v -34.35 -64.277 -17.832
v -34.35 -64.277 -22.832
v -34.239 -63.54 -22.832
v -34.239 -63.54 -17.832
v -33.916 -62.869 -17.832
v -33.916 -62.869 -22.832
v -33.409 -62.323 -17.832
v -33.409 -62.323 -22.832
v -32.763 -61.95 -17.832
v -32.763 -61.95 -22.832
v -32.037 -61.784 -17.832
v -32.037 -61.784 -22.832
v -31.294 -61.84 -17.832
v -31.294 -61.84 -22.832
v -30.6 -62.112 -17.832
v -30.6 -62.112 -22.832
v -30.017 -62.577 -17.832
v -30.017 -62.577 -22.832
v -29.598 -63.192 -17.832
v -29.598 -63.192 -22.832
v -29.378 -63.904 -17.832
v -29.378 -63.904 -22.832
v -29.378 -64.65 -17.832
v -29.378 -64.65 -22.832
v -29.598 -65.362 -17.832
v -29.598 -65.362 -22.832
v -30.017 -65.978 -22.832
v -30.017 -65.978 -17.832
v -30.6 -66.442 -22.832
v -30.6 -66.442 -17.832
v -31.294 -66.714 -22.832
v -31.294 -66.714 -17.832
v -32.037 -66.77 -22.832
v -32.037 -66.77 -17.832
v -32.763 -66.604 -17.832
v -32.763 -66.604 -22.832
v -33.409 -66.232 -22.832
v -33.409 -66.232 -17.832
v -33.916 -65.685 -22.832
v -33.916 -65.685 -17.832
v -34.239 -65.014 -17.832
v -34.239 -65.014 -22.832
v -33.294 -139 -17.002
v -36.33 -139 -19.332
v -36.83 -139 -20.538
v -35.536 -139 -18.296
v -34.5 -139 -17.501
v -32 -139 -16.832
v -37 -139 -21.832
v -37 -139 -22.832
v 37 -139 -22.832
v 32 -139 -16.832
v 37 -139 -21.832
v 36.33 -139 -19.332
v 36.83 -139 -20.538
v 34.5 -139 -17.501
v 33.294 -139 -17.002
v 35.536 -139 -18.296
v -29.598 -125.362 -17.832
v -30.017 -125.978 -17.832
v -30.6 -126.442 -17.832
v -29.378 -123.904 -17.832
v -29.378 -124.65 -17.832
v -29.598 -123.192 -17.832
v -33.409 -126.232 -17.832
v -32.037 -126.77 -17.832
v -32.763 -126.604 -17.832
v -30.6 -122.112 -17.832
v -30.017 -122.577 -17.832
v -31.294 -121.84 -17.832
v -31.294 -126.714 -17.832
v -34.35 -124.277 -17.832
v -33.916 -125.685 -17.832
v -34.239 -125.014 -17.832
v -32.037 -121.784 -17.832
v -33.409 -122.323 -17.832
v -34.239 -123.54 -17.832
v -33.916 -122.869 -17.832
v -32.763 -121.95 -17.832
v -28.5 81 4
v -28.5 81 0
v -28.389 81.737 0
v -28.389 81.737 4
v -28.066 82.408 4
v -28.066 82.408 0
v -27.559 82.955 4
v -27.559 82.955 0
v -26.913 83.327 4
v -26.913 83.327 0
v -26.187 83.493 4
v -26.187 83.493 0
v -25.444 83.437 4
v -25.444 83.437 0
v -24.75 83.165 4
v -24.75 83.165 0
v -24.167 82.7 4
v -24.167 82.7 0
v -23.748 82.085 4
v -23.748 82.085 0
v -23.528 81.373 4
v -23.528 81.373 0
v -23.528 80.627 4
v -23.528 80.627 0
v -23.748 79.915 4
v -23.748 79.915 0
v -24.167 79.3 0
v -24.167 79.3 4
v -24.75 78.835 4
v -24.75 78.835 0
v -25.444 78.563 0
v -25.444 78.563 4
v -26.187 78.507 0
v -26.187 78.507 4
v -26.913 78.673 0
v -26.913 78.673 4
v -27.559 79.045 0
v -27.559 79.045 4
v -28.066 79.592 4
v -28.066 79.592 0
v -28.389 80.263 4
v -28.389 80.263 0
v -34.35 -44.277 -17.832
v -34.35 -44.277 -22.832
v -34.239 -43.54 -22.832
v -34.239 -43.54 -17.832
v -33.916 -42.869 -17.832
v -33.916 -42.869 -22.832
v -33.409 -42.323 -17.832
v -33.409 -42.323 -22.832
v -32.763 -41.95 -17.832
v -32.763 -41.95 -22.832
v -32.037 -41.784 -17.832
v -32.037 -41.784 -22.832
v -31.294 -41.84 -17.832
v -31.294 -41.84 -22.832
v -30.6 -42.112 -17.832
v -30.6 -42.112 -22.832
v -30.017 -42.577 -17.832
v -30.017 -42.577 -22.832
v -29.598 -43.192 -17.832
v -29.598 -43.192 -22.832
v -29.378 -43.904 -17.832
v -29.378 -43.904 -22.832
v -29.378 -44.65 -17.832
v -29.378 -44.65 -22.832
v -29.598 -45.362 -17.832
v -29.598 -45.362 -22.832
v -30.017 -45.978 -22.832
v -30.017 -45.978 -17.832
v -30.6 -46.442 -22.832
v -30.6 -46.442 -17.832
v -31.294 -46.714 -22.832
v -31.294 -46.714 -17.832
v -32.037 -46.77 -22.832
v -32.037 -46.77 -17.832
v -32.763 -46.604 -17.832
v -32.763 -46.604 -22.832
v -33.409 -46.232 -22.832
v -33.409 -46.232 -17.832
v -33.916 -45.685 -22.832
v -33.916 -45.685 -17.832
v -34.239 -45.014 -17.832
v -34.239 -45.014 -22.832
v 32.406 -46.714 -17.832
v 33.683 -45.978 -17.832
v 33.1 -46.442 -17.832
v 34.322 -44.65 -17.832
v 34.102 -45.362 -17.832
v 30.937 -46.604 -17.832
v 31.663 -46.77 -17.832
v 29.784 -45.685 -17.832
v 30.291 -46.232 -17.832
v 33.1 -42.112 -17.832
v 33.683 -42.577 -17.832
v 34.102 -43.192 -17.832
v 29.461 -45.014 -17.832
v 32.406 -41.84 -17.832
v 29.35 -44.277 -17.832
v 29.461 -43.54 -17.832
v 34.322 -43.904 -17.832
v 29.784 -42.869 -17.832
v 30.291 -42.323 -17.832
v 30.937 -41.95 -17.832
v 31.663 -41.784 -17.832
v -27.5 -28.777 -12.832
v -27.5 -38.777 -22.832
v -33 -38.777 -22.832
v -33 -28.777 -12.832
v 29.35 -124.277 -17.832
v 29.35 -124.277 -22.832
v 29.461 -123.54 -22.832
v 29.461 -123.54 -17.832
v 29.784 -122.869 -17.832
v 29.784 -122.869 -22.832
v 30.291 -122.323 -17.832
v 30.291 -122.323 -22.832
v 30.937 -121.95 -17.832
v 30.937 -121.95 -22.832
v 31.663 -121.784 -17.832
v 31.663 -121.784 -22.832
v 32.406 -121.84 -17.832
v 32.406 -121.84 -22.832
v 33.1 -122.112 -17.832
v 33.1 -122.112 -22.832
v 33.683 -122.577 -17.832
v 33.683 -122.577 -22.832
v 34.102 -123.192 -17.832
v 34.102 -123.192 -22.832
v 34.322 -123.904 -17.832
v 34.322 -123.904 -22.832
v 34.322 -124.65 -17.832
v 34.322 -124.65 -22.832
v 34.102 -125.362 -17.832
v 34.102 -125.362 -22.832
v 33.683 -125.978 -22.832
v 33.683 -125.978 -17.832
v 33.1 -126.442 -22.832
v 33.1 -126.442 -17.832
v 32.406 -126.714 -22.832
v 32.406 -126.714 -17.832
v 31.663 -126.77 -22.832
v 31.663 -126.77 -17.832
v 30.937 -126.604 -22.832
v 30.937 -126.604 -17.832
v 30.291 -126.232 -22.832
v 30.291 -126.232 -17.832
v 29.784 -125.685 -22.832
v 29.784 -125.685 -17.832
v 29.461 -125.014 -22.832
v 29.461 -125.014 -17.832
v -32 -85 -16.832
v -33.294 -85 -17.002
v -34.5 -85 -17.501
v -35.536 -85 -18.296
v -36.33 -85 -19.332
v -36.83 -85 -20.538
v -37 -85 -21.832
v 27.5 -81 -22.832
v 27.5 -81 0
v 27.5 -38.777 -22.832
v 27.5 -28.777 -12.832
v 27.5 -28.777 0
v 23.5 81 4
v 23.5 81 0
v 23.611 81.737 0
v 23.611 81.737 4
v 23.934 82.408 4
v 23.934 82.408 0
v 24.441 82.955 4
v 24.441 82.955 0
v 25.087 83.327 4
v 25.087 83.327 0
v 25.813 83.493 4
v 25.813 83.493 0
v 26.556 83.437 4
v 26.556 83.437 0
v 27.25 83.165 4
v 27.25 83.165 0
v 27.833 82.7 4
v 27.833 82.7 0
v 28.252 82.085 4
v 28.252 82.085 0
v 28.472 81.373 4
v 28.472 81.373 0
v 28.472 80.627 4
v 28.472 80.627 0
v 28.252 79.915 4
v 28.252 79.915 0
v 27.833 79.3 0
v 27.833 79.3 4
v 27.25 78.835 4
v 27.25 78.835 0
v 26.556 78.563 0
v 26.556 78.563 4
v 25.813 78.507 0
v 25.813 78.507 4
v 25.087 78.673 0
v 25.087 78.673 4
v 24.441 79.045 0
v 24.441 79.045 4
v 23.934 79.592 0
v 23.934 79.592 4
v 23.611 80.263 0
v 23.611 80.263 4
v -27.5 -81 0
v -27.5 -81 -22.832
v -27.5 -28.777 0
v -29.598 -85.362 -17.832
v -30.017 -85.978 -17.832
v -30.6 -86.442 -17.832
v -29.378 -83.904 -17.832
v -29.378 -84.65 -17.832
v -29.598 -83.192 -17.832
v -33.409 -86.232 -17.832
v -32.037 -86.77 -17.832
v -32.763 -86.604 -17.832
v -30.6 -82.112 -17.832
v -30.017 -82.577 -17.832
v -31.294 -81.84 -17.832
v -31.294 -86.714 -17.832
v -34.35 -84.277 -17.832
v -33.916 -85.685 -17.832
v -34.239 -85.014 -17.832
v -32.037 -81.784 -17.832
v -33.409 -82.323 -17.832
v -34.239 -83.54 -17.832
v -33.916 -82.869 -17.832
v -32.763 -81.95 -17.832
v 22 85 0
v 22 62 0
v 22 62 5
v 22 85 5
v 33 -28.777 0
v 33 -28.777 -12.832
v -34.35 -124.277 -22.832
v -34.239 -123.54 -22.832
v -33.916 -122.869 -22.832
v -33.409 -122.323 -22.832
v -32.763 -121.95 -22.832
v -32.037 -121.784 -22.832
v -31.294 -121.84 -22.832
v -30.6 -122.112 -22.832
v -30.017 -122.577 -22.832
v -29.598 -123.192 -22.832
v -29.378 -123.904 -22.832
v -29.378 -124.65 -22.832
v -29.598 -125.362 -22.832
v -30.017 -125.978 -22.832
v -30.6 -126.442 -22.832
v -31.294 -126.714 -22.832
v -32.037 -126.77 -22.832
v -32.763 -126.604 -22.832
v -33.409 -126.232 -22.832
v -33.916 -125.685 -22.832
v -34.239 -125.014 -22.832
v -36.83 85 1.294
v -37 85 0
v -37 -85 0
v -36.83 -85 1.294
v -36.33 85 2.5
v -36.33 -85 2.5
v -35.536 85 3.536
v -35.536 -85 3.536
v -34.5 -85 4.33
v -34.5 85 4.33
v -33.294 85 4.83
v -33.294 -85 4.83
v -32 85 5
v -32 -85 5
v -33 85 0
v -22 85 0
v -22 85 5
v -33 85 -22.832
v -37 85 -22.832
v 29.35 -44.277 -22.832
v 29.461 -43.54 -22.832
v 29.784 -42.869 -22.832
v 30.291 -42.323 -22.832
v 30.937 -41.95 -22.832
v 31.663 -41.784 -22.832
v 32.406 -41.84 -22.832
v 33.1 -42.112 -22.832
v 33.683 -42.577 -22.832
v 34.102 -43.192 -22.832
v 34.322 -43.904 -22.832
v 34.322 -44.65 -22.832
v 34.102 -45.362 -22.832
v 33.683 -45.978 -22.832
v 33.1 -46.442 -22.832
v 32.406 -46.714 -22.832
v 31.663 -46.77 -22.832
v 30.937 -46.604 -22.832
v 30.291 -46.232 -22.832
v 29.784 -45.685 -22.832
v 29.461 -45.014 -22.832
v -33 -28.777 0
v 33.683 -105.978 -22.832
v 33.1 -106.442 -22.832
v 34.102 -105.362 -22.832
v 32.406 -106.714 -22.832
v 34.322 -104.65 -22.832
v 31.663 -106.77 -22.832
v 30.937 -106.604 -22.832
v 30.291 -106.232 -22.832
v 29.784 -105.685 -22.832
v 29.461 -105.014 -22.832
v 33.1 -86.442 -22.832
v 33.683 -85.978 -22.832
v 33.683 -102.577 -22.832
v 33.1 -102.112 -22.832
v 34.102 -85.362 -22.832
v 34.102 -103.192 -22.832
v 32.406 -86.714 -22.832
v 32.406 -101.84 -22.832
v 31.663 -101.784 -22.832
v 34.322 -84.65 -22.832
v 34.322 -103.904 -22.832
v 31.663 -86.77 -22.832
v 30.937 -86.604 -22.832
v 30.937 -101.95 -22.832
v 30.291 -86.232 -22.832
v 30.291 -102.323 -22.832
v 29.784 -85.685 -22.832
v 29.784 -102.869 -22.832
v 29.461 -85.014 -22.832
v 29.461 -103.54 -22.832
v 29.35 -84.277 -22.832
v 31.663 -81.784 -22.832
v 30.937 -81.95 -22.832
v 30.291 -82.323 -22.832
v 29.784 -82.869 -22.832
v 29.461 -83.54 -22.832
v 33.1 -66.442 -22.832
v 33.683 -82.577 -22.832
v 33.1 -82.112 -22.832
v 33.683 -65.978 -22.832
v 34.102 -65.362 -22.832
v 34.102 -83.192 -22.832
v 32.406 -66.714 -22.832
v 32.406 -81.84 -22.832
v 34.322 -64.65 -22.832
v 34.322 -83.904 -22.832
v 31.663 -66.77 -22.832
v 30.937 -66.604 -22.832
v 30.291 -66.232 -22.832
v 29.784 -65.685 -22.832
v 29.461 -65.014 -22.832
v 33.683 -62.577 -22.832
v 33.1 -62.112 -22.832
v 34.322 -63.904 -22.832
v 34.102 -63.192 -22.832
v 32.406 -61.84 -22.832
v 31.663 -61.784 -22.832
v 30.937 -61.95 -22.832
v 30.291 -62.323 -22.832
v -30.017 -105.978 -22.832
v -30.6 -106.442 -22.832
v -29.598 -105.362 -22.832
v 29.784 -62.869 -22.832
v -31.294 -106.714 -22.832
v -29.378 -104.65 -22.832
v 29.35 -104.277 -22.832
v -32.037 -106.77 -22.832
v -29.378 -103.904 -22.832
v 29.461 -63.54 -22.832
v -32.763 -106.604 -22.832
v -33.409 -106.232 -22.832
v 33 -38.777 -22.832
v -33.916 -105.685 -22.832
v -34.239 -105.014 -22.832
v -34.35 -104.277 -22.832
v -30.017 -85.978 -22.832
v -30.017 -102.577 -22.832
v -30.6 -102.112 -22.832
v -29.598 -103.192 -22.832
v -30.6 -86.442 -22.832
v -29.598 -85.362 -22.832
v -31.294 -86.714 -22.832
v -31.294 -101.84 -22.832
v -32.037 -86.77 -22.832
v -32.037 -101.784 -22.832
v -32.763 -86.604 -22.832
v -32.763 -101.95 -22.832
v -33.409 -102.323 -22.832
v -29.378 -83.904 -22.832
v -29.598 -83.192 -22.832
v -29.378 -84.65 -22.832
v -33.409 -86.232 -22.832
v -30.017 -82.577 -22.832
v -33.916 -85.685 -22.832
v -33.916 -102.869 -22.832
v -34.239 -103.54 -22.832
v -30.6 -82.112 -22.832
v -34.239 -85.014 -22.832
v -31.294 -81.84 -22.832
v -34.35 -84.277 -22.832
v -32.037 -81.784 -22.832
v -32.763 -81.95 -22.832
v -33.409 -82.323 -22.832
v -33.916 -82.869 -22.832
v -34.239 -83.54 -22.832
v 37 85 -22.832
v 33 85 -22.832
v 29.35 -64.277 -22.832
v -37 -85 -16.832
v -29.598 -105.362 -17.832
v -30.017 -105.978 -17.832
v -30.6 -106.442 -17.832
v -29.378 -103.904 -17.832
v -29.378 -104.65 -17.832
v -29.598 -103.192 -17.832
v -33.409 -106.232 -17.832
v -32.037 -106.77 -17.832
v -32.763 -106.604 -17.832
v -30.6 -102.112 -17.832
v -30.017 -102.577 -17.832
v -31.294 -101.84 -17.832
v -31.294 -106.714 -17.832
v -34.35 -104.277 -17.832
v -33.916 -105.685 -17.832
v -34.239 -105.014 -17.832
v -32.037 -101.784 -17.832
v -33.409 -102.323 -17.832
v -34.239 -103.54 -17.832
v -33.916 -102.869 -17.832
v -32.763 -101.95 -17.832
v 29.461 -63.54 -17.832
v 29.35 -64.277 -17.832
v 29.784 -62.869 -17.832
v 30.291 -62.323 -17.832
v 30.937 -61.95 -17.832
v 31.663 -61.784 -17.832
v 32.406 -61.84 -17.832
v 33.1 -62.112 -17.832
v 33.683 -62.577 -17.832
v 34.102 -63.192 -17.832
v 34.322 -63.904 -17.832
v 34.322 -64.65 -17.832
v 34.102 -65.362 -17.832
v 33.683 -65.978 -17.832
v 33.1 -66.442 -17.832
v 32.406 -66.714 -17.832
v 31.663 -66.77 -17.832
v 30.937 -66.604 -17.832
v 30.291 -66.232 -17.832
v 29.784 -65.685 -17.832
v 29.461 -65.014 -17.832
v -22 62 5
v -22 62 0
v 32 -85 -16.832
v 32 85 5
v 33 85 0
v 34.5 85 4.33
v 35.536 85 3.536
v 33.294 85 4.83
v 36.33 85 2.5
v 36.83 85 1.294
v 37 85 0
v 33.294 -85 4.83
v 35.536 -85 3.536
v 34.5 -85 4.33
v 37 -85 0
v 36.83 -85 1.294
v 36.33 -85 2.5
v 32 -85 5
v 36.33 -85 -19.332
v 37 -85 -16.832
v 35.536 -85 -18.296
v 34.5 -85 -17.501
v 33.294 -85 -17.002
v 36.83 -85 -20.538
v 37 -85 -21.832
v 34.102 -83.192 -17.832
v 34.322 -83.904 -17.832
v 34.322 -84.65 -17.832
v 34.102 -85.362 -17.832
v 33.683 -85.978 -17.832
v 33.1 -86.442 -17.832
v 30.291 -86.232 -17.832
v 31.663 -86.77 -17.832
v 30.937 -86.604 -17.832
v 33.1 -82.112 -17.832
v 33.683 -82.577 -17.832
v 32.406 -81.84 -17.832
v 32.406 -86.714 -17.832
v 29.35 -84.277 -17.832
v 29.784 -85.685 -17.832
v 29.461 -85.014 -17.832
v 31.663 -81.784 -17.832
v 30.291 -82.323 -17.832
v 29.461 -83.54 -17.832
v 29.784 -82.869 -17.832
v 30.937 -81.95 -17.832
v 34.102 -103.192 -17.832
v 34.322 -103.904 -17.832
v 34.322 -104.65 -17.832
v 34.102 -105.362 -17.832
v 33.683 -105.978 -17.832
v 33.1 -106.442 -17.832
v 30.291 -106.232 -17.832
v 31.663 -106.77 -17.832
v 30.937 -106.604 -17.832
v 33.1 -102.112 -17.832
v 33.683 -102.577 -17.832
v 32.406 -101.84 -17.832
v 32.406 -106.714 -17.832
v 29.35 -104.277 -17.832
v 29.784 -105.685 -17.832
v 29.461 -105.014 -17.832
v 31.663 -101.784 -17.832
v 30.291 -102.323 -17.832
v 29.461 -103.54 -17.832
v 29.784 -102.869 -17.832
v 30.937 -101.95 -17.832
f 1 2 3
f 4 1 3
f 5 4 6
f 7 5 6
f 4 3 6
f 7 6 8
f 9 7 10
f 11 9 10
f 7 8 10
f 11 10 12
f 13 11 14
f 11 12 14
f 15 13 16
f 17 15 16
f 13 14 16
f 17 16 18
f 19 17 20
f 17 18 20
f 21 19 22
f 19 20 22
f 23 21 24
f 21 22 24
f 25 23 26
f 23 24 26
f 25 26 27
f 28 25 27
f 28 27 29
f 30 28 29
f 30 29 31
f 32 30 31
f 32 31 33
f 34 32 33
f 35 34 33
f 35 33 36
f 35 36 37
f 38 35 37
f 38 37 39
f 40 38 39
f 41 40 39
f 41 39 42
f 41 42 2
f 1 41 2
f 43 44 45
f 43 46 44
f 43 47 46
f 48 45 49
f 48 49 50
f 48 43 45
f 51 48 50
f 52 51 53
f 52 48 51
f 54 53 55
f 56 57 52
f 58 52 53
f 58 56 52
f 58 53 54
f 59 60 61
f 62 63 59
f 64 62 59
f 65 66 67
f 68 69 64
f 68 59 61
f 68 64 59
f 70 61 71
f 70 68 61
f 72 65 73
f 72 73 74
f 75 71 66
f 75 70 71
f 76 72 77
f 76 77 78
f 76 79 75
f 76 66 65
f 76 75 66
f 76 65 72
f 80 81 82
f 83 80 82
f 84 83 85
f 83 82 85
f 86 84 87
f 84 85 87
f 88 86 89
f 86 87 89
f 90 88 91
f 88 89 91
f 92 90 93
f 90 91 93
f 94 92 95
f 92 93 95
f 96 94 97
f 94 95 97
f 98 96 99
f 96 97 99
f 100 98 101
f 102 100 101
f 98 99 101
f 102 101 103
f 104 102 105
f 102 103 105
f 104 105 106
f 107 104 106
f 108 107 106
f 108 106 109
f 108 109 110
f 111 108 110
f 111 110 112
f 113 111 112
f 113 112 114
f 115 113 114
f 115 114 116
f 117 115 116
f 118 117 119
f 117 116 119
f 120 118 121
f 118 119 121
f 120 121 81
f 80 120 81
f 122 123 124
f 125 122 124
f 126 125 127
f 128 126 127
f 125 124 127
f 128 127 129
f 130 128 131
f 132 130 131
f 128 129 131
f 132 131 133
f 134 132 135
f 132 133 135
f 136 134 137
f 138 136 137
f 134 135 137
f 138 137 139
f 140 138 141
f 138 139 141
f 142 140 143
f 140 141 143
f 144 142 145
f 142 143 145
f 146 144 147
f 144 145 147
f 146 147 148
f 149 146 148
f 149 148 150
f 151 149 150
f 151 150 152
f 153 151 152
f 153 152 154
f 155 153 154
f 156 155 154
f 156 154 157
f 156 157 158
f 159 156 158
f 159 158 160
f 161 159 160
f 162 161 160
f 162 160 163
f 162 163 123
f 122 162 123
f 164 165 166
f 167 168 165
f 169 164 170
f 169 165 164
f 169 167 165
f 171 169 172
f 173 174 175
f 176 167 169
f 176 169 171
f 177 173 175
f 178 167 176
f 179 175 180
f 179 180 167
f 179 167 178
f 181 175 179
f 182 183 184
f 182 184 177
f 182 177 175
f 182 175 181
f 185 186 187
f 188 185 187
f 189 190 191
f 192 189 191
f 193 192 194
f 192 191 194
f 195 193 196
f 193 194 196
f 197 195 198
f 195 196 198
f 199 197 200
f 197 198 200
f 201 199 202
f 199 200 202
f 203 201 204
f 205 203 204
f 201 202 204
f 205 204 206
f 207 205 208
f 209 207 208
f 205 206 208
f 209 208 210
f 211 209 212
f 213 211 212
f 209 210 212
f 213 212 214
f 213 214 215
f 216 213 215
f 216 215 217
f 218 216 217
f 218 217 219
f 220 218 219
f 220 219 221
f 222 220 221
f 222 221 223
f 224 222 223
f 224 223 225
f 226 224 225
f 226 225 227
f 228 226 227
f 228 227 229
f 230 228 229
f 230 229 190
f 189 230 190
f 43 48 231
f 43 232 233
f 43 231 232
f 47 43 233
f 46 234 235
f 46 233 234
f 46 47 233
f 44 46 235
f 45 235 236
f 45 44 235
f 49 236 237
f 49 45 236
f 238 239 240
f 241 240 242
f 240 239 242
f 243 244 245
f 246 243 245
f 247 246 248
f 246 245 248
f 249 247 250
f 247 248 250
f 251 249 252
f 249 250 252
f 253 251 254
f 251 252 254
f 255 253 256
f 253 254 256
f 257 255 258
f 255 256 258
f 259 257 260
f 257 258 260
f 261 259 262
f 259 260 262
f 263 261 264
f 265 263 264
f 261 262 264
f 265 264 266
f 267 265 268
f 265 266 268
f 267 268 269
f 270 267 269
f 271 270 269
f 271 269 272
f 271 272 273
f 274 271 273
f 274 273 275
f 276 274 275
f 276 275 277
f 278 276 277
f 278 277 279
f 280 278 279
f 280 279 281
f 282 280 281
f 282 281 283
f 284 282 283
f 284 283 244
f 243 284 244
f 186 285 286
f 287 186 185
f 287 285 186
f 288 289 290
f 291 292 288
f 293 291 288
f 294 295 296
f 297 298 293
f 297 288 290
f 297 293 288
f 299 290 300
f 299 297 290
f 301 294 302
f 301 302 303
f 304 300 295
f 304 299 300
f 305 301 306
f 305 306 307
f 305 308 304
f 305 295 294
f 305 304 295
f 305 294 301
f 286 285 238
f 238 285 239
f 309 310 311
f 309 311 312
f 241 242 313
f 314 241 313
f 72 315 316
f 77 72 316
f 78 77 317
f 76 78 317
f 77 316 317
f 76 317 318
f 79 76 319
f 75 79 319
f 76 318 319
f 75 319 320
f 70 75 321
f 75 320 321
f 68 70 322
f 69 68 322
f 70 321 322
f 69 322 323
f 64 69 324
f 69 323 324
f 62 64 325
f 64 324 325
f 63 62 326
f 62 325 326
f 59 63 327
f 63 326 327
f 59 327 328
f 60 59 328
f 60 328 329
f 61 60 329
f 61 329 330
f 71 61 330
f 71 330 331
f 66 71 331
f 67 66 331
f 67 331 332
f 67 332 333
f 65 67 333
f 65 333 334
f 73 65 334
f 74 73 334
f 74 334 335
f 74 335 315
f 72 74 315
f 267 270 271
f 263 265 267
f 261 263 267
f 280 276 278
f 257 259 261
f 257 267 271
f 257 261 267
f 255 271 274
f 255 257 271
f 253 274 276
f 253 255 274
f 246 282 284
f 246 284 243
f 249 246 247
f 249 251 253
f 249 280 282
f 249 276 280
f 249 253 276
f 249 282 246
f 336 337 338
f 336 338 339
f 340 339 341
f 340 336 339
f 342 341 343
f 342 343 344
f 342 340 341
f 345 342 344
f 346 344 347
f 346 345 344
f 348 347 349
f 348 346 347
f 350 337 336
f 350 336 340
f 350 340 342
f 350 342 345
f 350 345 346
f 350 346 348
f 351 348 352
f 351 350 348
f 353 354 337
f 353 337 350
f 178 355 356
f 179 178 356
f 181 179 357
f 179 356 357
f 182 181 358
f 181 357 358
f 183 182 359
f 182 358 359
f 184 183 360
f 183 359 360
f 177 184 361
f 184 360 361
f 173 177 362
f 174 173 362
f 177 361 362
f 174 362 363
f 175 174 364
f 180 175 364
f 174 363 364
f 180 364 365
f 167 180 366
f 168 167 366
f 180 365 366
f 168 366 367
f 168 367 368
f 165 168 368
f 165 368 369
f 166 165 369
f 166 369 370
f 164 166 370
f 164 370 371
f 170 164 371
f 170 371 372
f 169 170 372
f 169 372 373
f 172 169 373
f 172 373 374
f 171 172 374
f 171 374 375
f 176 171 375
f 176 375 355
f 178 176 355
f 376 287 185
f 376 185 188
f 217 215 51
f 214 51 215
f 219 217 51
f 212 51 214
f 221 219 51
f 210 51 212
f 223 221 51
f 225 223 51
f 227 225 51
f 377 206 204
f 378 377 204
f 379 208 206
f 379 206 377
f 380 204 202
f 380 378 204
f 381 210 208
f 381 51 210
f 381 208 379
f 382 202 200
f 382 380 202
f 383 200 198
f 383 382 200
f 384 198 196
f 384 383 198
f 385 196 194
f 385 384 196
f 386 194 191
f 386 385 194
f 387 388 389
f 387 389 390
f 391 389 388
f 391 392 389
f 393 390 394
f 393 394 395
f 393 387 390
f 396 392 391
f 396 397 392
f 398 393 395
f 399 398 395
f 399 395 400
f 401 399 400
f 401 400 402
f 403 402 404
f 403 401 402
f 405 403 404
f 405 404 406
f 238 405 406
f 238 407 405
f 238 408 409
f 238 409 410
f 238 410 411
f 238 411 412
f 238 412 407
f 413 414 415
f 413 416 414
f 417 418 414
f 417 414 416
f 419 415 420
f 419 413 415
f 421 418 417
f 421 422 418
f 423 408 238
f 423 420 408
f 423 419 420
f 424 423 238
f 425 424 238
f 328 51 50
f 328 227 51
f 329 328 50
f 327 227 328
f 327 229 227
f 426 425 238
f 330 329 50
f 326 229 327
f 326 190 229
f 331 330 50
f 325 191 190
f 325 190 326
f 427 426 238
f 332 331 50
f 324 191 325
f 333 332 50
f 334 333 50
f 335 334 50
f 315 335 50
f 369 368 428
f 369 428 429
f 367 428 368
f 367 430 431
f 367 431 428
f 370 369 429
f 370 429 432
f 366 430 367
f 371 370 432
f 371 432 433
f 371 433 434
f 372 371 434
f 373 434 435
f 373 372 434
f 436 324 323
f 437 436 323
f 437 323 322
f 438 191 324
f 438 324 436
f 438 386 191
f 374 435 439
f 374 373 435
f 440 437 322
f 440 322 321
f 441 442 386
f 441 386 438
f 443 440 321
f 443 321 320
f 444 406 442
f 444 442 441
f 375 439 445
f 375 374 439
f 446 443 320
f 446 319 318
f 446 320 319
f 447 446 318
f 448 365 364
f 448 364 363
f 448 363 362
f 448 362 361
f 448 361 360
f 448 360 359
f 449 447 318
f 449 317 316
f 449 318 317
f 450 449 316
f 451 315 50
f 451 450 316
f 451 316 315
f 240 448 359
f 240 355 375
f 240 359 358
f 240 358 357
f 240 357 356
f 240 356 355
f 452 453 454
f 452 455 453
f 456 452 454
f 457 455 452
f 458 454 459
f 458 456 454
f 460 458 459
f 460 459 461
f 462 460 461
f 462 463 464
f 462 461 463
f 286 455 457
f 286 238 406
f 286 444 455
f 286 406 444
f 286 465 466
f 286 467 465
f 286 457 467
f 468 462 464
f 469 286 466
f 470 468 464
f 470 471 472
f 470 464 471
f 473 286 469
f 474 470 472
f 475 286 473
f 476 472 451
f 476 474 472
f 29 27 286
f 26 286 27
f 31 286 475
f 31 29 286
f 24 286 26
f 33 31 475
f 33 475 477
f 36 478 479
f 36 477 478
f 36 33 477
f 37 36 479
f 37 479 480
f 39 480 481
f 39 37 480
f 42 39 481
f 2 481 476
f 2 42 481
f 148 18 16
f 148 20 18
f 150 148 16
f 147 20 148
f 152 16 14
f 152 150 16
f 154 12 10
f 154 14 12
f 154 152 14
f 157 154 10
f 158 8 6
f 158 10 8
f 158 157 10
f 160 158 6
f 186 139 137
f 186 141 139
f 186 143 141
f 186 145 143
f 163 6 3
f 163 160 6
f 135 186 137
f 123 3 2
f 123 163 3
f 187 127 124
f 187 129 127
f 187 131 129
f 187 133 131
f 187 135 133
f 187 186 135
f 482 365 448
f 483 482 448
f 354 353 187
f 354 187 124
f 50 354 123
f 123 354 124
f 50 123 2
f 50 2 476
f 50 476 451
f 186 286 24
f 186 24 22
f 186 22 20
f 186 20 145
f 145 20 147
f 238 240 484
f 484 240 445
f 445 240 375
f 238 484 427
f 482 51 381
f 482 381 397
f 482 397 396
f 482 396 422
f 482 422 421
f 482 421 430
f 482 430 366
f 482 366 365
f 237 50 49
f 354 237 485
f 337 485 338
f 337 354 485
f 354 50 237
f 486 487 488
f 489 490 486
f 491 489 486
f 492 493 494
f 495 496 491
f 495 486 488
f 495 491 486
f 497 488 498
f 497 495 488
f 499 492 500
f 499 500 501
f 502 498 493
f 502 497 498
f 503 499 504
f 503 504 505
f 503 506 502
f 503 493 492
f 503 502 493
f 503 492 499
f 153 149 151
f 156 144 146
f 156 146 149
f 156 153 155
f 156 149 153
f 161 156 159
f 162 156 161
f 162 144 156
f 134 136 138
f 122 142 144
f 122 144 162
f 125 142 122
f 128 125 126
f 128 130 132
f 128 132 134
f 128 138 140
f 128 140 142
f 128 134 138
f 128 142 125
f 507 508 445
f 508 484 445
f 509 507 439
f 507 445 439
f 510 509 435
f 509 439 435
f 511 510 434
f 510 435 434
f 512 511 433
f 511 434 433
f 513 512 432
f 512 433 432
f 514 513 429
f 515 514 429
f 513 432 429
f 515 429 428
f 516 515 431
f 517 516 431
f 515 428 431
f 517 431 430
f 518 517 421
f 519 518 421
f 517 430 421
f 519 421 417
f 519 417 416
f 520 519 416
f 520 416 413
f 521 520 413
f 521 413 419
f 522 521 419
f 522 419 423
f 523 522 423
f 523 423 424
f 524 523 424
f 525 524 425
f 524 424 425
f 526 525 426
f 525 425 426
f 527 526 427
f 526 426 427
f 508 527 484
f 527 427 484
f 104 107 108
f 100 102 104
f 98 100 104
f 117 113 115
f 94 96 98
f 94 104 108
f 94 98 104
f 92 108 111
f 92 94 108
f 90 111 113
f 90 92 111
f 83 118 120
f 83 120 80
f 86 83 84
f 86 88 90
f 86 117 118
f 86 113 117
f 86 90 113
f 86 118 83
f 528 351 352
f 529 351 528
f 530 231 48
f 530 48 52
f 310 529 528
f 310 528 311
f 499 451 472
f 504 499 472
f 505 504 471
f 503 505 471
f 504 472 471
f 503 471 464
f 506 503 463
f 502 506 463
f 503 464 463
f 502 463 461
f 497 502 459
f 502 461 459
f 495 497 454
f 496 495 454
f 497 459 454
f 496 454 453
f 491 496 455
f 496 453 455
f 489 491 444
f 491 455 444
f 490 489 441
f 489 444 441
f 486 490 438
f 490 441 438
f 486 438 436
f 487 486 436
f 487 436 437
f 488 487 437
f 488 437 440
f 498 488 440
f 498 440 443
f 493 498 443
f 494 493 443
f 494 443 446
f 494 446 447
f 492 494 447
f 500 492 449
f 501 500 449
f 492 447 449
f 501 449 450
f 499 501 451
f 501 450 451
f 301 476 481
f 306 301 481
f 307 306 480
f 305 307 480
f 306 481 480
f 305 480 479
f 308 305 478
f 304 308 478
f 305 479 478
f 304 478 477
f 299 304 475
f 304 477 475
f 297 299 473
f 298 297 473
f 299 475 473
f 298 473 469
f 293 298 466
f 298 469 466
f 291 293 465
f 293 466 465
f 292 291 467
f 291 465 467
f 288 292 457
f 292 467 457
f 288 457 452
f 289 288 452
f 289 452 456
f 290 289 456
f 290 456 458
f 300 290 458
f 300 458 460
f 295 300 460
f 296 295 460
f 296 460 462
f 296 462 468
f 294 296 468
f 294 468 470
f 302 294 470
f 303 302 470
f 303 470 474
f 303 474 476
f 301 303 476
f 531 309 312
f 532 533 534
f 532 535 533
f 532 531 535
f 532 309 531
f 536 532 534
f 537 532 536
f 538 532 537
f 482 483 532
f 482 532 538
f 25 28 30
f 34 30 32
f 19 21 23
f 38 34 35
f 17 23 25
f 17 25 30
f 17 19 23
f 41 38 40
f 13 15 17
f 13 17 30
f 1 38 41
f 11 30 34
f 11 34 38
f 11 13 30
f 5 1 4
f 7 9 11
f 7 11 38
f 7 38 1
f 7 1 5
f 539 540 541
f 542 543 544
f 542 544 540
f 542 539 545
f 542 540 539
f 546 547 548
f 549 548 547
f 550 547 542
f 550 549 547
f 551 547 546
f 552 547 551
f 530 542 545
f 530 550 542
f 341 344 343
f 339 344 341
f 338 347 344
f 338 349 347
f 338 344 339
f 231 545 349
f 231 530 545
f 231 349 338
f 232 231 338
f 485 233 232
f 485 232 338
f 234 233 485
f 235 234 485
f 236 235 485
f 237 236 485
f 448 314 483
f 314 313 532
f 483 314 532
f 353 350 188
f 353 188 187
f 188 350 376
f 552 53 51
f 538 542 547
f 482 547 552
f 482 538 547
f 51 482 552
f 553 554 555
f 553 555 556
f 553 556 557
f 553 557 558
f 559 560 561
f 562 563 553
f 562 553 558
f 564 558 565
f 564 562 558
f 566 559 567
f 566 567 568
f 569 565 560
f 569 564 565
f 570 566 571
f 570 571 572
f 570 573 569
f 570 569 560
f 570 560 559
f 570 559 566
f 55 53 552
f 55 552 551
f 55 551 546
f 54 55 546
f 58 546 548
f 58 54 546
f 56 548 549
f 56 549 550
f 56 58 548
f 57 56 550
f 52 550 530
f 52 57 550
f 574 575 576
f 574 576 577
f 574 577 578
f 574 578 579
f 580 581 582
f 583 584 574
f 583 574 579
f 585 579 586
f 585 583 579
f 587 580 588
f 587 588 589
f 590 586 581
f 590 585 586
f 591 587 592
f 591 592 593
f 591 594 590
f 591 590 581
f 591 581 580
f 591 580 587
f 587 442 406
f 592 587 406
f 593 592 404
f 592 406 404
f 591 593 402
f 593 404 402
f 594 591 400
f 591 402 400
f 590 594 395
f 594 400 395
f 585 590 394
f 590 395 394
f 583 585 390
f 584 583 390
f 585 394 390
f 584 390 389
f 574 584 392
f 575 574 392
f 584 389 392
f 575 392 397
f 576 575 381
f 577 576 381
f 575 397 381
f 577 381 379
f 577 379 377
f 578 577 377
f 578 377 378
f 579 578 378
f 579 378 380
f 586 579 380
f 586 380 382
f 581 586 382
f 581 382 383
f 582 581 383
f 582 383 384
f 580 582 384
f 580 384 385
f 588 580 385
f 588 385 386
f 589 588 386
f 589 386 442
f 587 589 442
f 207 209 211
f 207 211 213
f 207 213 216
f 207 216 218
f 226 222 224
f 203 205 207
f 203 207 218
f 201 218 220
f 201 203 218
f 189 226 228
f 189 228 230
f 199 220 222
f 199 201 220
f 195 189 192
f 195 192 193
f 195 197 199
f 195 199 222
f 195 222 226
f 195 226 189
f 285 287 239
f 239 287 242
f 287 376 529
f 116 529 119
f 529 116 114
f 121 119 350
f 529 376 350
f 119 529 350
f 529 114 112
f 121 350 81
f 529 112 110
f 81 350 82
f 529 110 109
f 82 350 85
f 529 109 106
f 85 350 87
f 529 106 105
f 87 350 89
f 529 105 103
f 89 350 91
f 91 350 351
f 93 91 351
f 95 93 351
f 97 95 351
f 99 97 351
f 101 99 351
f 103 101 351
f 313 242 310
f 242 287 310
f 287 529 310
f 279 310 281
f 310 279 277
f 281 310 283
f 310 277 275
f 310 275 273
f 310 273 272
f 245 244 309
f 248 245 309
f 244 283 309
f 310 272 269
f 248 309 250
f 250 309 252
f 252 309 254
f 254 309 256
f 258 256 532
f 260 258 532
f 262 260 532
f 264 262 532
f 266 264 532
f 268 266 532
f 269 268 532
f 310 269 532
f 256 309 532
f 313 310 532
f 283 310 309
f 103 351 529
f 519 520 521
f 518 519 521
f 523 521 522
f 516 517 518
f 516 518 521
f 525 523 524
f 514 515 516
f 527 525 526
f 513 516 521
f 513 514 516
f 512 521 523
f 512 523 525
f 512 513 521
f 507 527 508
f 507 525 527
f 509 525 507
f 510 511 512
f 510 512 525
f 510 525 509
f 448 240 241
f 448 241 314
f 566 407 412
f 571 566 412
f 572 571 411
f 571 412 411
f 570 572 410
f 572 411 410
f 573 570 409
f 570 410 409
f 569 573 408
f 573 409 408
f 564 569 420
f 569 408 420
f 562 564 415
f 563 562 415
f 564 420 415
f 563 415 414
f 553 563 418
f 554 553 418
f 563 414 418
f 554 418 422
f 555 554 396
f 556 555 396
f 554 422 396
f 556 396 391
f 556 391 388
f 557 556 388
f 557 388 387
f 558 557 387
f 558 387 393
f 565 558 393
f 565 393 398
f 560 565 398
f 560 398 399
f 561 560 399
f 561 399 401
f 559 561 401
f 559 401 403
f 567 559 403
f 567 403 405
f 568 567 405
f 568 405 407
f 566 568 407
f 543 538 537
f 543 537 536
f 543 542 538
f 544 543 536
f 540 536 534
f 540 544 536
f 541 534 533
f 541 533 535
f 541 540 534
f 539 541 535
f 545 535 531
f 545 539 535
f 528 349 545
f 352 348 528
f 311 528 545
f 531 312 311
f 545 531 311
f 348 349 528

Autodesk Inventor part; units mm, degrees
ref_plane "YZ Plane" through (0, 0, 0) normal (1, 0, 0) x (0, 1, 0)
ref_plane "XZ Plane" through (0, 0, 0) normal (0, 1, 0) x (-1, 0, 0)
ref_plane "XY Plane" through (0, 0, 0) normal (0, 0, 1) x (1, 0, 0)
sketch "Sketch1" plane through (0, 0, 0) normal (0, 0, 1) x (1, 0, 0)
  line L0 (-37, 85) -> (37, 85)
  line L1 (37, 85) -> (37, -85)
  line L2 (37, -85) -> (-37, -85)
  line L3 (-37, -85) -> (-37, 85)
  line L4 (-37, 85) -> (37, -85) construction
  line L5 (37, 85) -> (-37, -85) construction
  line L6 (22, 85) -> (-22, 85)
  line L7 (-22, 85) -> (-22, 62)
  line L8 (-22, 62) -> (22, 62)
  line L9 (22, 62) -> (22, 85)
  point P0 (0, 0)
  point P1 (0, 62)
  point P2 (0, 85)
  point P3 (-22, 85)
  dimension "d0" = 74
  dimension "d1" = 170
  dimension "d9" = 44
  dimension "d10" = 23
extrude "Extrusion1" add sketch "Sketch1" along normal blind 5 contours L0 L7 L8 L9 L1 L2 L3
sketch "Sketch2" plane through (0, 0, 0) normal (0, 0, -1) x (-1, 0, 0)
  circle A0 centre (-26, 81) radius 2.5
  line L0 (0, 0) -> (0, 85)
  line L1 (-37, 85) -> (37, 85) projected
  circle A1 centre (26, 81) radius 2.5
  dimension "d4" = 5
  dimension "d5" = 52
  dimension "d8" = 4
extrude "Extrusion2" cut sketch "Sketch2" against normal blind 4
sketch "Sketch3" plane through (0, 0, 0) normal (0, 0, -1) x (-1, 0, 0)
  line L0 (37, -85) -> (-37, -85) projected
  line L1 (-37, 85) -> (-37, -85)
  line L2 (-37, -85) -> (37, -85)
  line L3 (37, -85) -> (37, 85)
  line L4 (33, 85) -> (33, -81)
  line L5 (33, -81) -> (-33, -81)
  line L6 (-33, -81) -> (-33, 85)
  line L7 (-37, 85) -> (-22, 85) projected
  line L8 (-37, 85) -> (-33, 85)
  line L9 (22, 85) -> (37, 85) projected
  line L10 (33, 85) -> (37, 85)
  line L11 (-33, -81) -> (-27.5, -81)
  line L12 (-27.5, -81) -> (-27.5, -28.7771)
  line L13 (-27.5, -28.7771) -> (-33, -28.7771)
  line L14 (-33, -28.7771) -> (-33, -81)
  line L15 (33, -81) -> (27.5, -81)
  line L16 (27.5, -81) -> (27.5, -28.7771)
  line L17 (27.5, -28.7771) -> (33, -28.7771)
  line L18 (33, -28.7771) -> (33, -81)
  point P0 (0, 0)
  point P1 (33, -28.7771)
  point P2 (-33, -28.7771)
  dimension "d12" = 4
  dimension "d18" = 52.2229
  dimension "d19" = 5.5
  dimension "d20" = 5.5
extrude "Extrusion3" add sketch "Sketch3" along normal blind 22.8316
sketch "Sketch4" plane through (-37, -85, 5) normal (0, -1, 0) x (1, 0, 0)
  line L0 (70, -27.8316) -> (74, -27.8316) projected
  line L1 (74, -27.8316) -> (0, -27.8316)
  line L2 (0, -27.8316) -> (0, -21.8316)
  line L3 (0, -21.8316) -> (74, -21.8316)
  line L4 (74, -21.8316) -> (74, -27.8316)
  point P0 (37, -5)
  dimension "d15" = 6
  dimension "d21" = 74
extrude "Extrusion4" add sketch "Sketch4" along normal blind 54
chamfer "Chamfer1" distance 10 angle 45 2 edges at (30.25, -28.7771, -22.8316) (-30.25, -28.7771, -22.8316)
sketch "Sketch5" plane through (0, 0, -22.8316) normal (0, 0, -1) x (-1, 0, 0)
  line L0 (-31.85, -29.2771) -> (-31.85, -139.7771)
  line L1 (-31.85, -29.2771) -> (78.65, -29.2771) construction
  circle A0 centre (-31.85, -44.2771) radius 2.5
  circle A1 centre (-31.85, -64.2771) radius 2.5
  circle A2 centre (-31.85, -84.2771) radius 2.5
  circle A3 centre (-31.85, -104.2771) radius 2.5
  circle A4 centre (-31.85, -124.2771) radius 2.5
  line L2 (-27.5, -28.7771) -> (-27.5, -81) projected
  line L3 (-37, -85) -> (-37, 85) projected
  line L4 (-27.5, -28.7771) -> (-33, -28.7771) projected
  line L5 (-37, -139) -> (37, -139) projected
  line L6 (0, -139) -> (0, -29.2771)
  circle A5 centre (31.85, -44.2771) radius 2.5
  circle A6 centre (31.85, -64.2771) radius 2.5
  circle A7 centre (31.85, -84.2771) radius 2.5
  circle A8 centre (31.85, -104.2771) radius 2.5
  circle A9 centre (31.85, -124.2771) radius 2.5
  point P0 (0, 0)
  point P1 (-31.85, -36)
  dimension "d23" = 110.5
  dimension "d24" = 90
  dimension "d25" = 5
  dimension "d26" = 15
  dimension "d29" = 20
  dimension "d39" = 5.15
  dimension "d40" = 0.5
extrude "Extrusion5" cut sketch "Sketch5" against normal blind 5
fillet "Fillet1" radius 5 4 edges at (37, 0, 5) (-37, 0, 5) (37, -112, -16.8316) (-37, -112, -16.8316)
properties part number "cover^3"
